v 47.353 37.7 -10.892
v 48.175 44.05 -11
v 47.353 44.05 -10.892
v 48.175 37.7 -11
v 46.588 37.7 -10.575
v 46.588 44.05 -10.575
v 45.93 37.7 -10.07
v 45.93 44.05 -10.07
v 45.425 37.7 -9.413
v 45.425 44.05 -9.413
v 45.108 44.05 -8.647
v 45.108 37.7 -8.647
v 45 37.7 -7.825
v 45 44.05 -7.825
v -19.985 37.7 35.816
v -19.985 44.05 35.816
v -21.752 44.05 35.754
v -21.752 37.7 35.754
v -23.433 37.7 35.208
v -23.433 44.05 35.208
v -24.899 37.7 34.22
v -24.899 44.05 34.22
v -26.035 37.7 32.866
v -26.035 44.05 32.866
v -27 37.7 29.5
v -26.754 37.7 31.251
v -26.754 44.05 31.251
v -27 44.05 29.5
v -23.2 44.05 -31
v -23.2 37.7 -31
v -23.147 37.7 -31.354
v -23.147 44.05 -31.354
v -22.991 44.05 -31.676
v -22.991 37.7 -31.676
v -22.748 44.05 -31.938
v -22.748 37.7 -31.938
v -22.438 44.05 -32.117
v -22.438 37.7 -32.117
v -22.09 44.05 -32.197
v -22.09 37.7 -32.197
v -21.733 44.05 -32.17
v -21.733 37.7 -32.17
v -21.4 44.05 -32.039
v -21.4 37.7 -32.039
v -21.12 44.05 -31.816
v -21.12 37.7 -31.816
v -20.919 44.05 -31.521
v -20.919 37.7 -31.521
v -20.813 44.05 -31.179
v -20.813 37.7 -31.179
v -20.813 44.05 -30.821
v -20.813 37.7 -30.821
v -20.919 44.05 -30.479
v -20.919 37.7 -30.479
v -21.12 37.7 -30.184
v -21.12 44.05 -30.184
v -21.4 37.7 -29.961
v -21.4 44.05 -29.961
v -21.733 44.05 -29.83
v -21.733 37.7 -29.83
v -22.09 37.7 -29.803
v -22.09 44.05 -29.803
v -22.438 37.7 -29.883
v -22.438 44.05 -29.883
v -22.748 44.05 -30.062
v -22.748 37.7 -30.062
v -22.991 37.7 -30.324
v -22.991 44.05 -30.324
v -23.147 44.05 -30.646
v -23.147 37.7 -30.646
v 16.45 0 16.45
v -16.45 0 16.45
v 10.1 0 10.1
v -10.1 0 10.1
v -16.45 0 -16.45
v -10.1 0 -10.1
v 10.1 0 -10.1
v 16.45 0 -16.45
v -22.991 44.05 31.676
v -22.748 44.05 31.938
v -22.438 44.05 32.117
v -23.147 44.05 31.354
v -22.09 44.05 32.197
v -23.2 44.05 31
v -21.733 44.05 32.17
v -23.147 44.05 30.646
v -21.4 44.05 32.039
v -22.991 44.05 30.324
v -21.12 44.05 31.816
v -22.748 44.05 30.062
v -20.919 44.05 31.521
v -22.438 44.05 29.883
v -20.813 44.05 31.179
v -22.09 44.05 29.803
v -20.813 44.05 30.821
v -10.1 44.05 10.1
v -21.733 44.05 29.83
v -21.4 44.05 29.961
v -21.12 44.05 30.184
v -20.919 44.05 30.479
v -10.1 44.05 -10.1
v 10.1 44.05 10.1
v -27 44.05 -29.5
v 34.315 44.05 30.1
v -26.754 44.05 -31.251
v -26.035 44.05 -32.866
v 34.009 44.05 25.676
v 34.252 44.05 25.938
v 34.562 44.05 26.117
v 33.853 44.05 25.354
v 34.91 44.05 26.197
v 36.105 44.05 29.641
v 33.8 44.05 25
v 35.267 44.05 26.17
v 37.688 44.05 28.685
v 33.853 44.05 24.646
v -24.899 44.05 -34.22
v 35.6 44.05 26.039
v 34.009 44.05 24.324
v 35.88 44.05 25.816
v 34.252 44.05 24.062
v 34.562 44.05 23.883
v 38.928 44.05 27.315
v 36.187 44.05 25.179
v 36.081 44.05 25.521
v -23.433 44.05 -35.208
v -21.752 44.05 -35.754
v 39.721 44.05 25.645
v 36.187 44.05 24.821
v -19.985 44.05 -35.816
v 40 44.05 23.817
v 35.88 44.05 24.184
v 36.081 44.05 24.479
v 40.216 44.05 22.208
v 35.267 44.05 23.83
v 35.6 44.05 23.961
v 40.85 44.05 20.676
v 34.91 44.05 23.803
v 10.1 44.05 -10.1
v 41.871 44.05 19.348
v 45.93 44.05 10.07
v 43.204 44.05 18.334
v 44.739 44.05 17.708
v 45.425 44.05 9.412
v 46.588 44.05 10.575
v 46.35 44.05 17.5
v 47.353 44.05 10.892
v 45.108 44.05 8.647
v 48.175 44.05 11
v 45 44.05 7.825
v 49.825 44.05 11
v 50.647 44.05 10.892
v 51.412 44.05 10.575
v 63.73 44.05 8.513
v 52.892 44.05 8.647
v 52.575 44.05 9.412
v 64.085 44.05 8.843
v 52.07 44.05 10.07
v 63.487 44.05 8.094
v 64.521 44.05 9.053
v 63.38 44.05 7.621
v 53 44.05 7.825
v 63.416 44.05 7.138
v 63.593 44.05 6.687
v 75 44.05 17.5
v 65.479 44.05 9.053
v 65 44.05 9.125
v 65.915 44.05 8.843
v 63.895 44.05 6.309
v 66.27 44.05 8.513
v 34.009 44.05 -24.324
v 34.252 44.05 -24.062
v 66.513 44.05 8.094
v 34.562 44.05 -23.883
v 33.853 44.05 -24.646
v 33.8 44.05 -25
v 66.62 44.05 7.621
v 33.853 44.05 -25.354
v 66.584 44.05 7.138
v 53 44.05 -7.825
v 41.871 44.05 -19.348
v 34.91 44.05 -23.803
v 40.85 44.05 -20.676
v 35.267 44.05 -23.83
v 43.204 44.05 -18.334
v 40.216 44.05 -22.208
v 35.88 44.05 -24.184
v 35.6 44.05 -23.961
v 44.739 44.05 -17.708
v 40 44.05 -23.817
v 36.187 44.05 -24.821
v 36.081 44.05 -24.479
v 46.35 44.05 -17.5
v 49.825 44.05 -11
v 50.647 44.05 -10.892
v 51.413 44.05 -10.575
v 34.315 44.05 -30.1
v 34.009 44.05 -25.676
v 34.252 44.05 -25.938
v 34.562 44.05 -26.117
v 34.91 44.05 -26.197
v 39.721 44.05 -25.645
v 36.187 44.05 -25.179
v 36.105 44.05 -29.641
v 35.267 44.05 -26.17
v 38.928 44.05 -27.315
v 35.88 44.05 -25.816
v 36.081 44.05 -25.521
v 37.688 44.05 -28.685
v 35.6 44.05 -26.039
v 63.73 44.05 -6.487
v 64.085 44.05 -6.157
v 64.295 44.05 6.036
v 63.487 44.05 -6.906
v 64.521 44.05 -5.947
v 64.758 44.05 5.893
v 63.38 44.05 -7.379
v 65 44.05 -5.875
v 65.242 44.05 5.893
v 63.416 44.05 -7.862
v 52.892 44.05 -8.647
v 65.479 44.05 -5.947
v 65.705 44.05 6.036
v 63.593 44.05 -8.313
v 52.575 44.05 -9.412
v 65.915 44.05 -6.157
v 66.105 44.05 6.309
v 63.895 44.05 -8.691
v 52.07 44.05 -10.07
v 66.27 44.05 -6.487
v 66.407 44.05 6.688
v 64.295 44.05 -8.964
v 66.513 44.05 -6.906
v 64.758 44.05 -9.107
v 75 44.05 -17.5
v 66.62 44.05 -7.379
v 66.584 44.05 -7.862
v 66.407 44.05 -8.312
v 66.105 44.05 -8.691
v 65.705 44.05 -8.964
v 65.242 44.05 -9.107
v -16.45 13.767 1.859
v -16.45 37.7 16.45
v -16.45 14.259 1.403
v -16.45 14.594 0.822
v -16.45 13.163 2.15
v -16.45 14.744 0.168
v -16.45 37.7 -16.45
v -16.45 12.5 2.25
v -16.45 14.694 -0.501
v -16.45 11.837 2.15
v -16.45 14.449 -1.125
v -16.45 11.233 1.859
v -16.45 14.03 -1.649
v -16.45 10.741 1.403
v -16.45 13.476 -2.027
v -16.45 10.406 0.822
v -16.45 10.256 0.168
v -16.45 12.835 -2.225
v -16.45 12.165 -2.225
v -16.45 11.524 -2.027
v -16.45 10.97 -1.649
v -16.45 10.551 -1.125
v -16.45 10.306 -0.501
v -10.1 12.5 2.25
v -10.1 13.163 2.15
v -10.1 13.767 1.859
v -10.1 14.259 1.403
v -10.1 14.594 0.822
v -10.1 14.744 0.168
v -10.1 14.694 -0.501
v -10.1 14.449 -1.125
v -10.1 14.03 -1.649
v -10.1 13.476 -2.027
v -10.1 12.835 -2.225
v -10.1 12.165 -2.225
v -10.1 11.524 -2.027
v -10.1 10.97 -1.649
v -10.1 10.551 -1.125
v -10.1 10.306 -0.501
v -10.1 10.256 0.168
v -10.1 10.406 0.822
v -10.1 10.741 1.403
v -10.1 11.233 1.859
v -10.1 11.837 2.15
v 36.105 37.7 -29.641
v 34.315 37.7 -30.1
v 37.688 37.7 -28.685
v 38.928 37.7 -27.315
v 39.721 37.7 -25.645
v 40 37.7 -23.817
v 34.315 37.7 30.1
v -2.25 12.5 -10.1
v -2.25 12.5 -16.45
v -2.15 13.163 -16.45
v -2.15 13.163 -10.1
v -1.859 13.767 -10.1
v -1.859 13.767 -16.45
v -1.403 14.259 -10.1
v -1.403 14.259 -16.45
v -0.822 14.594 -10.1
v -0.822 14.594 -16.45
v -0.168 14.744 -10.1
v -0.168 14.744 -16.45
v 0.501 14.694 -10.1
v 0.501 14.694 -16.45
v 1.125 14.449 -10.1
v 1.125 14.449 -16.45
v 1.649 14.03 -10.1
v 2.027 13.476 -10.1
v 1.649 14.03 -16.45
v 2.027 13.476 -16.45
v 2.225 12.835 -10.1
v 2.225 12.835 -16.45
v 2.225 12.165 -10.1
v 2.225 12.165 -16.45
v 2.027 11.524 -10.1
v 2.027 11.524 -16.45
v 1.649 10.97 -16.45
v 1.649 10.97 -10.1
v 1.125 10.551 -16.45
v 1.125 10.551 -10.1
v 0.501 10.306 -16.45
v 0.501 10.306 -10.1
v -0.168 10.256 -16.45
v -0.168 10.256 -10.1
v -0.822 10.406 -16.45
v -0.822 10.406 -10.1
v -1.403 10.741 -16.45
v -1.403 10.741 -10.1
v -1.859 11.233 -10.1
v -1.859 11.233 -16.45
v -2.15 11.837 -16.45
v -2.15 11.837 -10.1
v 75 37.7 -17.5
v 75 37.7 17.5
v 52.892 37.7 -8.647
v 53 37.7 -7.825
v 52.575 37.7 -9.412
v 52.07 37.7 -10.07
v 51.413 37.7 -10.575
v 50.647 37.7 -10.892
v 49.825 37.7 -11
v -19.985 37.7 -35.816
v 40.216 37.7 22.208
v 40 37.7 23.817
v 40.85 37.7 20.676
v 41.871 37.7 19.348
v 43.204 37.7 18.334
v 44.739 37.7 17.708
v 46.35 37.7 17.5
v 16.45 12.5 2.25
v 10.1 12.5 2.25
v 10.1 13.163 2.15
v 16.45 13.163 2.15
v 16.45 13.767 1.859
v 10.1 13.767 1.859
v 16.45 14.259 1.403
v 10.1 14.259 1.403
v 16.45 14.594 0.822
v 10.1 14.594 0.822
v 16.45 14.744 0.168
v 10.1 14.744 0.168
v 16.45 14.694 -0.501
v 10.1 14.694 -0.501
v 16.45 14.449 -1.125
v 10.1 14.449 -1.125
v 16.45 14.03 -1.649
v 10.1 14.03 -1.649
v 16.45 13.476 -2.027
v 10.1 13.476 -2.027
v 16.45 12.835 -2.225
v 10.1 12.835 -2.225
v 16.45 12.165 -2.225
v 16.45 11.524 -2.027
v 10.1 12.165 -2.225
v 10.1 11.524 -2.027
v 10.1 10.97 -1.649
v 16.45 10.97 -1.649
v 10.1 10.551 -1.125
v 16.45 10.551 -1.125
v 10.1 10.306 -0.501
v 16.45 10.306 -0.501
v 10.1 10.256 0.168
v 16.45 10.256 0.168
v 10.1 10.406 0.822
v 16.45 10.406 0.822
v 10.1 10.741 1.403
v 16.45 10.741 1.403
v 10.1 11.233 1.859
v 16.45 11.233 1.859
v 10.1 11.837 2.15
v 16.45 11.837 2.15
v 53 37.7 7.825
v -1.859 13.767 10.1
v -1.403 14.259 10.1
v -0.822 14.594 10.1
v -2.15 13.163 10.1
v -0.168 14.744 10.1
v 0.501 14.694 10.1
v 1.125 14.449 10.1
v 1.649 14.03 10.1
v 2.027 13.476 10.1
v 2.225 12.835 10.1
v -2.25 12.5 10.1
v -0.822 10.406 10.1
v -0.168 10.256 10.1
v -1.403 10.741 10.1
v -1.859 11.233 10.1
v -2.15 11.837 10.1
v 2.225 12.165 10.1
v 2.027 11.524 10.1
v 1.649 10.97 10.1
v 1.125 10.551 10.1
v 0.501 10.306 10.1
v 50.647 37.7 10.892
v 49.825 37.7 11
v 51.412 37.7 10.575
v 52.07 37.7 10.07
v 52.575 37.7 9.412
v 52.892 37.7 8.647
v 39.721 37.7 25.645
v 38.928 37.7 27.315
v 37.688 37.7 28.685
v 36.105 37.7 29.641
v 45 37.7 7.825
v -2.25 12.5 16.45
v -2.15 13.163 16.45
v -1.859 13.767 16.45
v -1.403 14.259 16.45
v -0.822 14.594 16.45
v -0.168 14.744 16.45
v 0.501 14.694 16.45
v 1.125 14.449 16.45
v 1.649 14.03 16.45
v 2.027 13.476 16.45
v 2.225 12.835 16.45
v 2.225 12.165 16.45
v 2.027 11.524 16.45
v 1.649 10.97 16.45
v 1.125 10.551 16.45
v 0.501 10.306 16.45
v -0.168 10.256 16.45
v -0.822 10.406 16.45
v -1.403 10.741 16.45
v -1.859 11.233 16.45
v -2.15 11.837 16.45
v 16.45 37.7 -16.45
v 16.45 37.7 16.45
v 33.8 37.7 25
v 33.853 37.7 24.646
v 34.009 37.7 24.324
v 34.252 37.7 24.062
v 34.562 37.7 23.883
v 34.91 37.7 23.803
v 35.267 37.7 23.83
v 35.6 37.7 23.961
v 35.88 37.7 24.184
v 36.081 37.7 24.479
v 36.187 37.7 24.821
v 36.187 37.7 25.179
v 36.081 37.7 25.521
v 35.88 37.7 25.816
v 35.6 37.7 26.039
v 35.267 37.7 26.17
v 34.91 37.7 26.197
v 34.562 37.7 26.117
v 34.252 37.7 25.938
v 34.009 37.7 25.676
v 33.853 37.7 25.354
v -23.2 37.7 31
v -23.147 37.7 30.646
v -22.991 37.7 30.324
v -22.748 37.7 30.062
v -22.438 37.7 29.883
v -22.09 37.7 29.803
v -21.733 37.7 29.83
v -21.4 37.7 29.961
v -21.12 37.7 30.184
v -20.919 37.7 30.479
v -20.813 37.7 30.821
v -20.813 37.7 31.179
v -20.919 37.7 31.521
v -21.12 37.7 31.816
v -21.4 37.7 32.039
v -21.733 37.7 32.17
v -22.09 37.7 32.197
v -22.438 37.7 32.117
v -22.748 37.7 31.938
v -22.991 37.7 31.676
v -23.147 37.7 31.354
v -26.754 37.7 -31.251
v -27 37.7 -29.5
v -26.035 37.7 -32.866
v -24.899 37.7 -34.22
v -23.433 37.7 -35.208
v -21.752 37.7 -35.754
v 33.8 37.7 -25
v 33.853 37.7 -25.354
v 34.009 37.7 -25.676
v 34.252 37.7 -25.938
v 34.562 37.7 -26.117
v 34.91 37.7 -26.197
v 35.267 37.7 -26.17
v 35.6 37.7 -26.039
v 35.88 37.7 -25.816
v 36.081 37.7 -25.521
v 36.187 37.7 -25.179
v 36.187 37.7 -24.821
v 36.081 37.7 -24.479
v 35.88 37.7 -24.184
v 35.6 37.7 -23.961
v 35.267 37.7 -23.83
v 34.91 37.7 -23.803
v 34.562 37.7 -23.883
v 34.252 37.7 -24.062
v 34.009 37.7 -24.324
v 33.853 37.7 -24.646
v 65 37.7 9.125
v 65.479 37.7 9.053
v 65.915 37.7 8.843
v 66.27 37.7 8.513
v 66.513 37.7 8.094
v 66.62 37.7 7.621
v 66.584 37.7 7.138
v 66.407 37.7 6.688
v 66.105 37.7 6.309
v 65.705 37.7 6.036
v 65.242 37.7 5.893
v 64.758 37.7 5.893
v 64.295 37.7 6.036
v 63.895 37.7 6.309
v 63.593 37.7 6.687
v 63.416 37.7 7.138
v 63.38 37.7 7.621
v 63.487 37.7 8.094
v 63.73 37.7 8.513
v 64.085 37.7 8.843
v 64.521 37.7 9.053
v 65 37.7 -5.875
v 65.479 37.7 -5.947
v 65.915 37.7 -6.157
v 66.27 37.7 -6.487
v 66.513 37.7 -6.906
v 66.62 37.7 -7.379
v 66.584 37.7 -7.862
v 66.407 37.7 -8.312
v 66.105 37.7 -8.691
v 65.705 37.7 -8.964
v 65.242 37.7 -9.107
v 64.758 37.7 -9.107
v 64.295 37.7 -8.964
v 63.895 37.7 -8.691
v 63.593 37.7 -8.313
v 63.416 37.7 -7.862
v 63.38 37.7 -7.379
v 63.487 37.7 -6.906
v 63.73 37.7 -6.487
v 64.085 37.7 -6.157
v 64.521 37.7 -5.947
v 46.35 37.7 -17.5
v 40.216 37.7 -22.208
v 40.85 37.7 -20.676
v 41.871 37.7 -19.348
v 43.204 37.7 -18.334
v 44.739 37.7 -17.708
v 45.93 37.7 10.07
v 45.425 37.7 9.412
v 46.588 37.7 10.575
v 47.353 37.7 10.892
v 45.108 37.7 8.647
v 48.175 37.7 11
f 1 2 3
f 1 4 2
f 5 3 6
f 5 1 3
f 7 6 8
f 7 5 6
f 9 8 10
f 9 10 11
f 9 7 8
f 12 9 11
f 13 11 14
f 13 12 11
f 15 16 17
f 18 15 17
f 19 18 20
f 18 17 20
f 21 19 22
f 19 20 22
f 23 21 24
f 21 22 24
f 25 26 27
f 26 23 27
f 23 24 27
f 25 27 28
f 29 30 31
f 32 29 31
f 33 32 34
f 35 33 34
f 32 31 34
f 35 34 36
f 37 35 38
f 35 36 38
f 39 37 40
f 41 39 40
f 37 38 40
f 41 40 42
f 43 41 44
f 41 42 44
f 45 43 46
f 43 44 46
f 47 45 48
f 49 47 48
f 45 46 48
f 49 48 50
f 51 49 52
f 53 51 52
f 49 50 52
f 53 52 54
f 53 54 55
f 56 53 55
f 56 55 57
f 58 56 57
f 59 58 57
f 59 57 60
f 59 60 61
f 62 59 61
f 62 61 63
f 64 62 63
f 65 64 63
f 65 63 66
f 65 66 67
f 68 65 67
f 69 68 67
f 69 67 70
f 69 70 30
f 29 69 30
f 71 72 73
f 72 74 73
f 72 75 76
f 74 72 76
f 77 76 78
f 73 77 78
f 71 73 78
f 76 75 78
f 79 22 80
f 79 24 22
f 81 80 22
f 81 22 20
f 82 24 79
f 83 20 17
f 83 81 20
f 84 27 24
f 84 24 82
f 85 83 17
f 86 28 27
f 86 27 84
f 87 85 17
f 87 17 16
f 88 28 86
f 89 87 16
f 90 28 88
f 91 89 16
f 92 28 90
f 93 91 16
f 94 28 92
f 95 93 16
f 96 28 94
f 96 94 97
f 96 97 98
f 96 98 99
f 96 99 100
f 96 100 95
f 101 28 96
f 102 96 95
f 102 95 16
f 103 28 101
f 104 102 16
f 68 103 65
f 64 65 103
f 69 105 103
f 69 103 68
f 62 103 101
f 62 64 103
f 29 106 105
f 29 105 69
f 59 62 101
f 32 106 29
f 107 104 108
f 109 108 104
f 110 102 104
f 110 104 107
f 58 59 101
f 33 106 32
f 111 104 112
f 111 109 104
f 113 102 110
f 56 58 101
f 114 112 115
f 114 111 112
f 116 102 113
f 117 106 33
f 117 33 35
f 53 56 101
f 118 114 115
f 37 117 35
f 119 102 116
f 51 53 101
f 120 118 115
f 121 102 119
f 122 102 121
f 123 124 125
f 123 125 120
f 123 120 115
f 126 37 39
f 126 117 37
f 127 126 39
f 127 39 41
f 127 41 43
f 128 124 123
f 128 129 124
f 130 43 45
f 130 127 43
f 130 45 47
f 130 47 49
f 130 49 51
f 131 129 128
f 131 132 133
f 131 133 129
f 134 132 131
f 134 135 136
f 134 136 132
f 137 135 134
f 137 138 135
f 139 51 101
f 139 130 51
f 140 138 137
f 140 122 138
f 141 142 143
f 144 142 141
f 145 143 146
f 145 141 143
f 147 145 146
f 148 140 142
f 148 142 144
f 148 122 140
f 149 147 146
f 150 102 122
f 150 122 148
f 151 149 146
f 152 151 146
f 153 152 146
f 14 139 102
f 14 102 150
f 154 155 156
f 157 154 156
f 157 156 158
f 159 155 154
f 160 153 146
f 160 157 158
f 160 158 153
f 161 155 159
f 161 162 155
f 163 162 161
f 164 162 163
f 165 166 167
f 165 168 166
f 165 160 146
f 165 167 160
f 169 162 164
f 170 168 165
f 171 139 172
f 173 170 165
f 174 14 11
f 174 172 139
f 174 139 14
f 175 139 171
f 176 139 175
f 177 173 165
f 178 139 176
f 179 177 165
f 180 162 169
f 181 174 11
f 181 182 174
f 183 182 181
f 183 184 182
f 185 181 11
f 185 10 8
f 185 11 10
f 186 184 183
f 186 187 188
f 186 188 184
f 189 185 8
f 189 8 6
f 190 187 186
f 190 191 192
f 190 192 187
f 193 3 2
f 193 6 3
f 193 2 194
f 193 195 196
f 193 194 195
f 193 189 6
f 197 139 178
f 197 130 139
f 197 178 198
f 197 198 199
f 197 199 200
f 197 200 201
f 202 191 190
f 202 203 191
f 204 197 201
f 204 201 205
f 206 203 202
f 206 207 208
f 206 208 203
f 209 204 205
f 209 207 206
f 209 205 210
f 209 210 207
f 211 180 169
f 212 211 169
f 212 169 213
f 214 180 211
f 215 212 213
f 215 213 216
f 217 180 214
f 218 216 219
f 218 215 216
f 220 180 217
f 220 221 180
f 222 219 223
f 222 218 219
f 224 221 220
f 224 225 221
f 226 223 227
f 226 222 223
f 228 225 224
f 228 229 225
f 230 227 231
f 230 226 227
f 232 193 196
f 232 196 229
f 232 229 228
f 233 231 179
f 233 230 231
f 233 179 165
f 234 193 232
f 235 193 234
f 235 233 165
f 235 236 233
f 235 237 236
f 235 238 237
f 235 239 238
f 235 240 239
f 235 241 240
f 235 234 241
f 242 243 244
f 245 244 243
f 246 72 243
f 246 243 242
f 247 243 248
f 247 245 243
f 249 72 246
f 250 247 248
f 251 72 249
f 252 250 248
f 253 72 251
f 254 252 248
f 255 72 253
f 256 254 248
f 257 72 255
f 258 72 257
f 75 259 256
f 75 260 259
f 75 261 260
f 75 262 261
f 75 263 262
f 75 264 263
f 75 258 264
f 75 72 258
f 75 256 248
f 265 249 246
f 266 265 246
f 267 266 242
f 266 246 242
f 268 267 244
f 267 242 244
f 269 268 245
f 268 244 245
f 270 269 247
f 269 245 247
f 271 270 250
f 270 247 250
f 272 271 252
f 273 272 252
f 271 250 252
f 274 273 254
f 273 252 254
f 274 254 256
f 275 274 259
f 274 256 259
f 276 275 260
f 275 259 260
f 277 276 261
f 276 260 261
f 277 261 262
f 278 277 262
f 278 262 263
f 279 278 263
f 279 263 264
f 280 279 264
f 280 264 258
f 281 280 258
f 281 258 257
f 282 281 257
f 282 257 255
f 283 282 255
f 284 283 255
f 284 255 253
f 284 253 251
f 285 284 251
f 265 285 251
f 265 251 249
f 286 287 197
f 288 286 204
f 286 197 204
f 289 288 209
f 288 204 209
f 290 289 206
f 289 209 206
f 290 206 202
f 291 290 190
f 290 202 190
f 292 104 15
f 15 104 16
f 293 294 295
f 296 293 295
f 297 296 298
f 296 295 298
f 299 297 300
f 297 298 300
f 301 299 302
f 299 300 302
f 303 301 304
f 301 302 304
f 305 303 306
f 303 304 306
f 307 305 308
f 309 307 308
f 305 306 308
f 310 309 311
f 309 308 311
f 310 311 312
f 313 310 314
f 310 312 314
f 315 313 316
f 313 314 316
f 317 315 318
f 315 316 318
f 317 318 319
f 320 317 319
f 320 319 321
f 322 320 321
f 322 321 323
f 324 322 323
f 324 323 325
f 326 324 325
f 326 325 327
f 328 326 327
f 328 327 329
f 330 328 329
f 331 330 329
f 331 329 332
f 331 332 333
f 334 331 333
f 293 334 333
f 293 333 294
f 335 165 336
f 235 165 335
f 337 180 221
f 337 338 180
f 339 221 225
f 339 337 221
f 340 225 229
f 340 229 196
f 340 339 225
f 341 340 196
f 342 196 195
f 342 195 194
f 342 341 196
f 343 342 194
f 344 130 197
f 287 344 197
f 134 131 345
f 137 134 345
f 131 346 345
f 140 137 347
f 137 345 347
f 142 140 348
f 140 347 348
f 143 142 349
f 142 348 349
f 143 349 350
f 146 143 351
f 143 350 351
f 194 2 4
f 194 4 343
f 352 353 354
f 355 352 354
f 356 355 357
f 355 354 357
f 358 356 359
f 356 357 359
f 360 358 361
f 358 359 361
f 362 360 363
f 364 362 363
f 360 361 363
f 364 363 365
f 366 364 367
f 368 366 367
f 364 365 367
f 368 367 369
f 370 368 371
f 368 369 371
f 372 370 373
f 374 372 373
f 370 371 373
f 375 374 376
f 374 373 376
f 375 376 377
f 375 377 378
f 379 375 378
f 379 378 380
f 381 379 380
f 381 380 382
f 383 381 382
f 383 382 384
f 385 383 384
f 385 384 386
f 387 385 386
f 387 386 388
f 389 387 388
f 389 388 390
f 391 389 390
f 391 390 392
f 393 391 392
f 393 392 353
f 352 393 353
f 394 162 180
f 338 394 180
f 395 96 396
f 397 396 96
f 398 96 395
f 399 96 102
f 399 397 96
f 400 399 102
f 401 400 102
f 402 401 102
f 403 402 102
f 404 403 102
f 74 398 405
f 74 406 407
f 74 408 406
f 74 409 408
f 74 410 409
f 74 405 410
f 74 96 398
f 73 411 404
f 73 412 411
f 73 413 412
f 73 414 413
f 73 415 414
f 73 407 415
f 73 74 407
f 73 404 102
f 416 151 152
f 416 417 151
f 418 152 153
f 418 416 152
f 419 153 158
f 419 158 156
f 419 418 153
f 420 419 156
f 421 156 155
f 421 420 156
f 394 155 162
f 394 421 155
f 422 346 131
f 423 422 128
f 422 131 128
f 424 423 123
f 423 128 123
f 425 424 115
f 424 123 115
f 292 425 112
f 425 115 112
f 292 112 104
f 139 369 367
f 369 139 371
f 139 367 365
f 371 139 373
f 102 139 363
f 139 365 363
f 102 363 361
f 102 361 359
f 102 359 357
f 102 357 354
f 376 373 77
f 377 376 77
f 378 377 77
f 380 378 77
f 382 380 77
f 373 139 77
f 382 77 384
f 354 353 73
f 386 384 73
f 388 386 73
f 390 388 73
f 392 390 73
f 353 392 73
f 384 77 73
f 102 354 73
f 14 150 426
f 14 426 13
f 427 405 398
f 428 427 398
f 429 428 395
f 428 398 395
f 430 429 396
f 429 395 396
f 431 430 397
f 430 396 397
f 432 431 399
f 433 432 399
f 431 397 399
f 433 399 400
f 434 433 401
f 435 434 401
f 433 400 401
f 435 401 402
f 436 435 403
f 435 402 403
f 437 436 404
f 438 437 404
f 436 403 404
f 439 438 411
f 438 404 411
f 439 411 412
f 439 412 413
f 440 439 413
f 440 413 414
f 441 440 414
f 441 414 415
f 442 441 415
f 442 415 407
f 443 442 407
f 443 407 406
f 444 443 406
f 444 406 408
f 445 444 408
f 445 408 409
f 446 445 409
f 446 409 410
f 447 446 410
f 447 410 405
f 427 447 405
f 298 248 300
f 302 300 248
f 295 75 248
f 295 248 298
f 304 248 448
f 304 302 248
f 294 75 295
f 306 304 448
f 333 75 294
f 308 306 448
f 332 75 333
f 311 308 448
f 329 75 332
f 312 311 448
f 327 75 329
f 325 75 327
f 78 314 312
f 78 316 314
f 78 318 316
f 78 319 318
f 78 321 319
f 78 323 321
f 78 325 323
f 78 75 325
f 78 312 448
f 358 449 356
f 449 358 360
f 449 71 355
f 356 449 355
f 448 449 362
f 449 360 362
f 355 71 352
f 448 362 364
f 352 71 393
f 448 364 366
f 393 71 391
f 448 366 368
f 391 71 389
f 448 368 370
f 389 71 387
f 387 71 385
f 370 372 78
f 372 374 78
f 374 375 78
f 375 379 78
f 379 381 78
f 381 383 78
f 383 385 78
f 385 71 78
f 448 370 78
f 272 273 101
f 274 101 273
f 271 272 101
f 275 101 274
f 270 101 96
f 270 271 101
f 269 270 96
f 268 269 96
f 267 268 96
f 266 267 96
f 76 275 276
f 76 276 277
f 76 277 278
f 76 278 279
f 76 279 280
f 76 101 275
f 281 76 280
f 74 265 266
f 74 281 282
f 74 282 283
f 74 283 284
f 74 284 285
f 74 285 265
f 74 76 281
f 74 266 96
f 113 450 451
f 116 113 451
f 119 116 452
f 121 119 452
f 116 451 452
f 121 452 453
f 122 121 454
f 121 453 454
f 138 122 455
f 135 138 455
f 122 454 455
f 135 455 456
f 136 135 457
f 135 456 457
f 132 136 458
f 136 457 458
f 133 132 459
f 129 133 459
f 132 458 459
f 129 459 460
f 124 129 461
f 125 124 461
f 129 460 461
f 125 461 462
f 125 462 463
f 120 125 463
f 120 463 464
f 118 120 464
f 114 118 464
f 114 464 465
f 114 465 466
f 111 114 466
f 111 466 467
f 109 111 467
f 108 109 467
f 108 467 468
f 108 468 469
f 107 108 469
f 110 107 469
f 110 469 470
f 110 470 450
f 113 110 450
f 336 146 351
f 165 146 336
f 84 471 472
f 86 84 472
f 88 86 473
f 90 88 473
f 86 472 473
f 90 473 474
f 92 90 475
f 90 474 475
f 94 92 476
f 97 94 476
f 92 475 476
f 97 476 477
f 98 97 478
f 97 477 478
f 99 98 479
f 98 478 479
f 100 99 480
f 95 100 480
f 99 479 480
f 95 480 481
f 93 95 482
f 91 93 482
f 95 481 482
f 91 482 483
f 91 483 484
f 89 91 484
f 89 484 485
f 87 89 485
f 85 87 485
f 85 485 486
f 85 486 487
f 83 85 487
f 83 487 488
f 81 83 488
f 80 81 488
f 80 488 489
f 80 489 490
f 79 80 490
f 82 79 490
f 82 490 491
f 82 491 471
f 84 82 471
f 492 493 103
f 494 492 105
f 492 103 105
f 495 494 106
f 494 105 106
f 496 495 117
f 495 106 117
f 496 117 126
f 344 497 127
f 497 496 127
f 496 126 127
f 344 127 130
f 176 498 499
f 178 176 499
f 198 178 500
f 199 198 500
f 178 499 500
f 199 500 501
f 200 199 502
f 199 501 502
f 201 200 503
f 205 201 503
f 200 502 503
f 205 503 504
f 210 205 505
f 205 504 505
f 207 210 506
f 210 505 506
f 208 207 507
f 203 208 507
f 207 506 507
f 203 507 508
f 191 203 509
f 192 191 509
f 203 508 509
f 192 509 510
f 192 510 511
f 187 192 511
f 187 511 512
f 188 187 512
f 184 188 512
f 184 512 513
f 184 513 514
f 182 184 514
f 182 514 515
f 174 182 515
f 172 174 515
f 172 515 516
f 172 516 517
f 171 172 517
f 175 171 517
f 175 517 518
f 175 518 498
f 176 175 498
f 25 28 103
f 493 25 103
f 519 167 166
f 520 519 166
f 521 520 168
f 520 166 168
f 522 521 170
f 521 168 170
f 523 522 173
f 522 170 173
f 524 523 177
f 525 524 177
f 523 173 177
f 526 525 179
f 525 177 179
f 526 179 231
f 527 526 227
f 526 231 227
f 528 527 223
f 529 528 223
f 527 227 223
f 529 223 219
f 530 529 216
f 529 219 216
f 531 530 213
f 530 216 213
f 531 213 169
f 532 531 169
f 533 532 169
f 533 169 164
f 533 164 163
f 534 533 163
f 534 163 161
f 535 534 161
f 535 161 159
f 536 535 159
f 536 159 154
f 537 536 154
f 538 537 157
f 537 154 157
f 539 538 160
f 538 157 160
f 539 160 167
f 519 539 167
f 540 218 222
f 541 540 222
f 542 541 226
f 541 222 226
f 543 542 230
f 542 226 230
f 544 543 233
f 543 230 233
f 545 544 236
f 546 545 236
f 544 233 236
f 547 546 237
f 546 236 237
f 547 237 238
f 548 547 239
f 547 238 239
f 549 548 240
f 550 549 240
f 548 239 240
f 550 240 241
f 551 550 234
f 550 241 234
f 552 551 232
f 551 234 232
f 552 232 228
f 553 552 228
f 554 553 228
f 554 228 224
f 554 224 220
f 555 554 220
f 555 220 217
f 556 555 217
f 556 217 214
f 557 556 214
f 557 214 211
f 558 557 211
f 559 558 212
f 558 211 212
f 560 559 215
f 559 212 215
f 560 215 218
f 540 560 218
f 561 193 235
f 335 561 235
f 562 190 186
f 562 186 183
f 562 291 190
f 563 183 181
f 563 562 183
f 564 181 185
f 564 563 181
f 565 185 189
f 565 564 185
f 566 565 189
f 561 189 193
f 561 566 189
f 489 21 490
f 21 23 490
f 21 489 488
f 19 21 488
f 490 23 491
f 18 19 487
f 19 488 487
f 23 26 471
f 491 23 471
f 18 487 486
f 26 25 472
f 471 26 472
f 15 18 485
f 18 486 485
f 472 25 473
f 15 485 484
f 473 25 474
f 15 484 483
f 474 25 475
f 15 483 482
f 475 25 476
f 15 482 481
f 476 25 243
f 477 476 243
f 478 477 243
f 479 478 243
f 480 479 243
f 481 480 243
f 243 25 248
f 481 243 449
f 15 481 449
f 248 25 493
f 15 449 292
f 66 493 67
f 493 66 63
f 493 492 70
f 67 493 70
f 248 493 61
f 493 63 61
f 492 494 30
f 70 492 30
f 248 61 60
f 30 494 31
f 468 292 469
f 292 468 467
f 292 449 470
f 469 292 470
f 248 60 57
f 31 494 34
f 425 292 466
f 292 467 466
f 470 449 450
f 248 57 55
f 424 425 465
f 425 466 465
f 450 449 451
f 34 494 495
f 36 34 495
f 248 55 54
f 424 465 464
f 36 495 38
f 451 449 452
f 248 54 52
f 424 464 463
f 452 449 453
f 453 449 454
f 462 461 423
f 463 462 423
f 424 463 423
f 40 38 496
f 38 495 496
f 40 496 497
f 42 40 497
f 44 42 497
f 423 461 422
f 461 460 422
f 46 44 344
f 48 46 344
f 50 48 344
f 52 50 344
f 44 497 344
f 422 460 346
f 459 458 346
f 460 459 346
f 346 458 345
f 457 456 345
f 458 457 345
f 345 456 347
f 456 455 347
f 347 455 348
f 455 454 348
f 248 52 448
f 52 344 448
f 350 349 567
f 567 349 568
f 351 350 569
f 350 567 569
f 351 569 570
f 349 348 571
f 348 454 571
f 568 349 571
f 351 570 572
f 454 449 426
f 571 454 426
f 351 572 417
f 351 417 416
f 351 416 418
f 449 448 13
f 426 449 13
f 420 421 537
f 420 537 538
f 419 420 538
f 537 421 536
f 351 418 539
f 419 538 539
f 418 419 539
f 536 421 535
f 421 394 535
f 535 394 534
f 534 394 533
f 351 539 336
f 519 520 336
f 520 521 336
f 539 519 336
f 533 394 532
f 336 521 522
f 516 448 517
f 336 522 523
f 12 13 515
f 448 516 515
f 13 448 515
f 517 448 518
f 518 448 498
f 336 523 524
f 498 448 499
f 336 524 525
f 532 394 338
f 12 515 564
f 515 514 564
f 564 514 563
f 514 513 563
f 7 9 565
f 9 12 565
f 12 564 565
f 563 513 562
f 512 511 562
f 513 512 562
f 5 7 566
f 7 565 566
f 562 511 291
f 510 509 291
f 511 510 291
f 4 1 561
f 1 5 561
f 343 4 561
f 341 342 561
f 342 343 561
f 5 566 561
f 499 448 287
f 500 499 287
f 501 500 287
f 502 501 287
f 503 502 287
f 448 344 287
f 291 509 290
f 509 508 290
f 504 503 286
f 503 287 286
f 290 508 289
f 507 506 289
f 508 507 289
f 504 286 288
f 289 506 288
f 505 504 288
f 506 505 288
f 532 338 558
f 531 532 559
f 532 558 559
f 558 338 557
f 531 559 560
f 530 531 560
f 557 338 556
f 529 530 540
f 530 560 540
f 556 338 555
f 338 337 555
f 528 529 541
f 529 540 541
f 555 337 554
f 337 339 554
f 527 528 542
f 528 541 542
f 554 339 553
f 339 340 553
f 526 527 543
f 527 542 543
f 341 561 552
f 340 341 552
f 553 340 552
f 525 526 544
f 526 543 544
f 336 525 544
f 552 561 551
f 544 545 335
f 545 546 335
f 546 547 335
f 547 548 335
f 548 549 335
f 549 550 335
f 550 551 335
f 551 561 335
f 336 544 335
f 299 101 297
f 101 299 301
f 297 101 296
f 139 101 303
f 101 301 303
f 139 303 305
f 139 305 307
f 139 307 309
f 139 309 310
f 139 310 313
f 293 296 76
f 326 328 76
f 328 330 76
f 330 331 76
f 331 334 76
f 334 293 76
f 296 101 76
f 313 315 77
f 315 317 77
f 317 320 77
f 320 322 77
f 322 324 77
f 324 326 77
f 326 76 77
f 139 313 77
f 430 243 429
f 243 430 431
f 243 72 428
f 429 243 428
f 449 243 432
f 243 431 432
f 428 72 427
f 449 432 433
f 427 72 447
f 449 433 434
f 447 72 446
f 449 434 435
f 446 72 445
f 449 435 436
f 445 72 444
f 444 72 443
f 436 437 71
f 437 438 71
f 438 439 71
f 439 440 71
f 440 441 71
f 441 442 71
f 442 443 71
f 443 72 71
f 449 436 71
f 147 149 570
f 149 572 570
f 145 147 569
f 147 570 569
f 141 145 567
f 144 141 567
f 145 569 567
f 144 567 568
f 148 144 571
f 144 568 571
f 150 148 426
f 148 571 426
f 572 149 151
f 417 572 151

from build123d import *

# Parameters (mm, degrees)
SKETCH1_W            = 32.9
SKETCH1_H            = 32.9
SKETCH1_W_2          = 20.2
SKETCH1_H_2          = 20.2
BOSS_EXTRUDE1_DEPTH  = 25
M4_CLEARANCE_HOLE1_D = 4.5
M4_CLEARANCE_HOLE2_D = 4.5
SKETCH8_W            = 32.9
SKETCH8_H            = 32.9
SKETCH8_W_2          = 20.2
SKETCH8_H_2          = 20.2
BOSS_EXTRUDE2_DEPTH  = 12.7
SKETCH9_W            = 87.4
SKETCH9_H            = 82.4
BOSS_EXTRUDE3_DEPTH  = 6.35
M2_CLEARANCE_HOLE1_D = 2.4
SKETCH13_W           = 20.2
SKETCH13_H           = 20.2
CUT_EXTRUDE1_DEPTH   = 71.911353111
SKETCH14_W           = 87.4
SKETCH14_H           = 82.4
CUT_EXTRUDE2_DEPTH   = 75.481759512
SKETCH15_W           = 35
SKETCH15_H           = 35
SKETCH15_R           = 1.625
BOSS_EXTRUDE4_DEPTH  = 6.35
FILLET1_R            = 6.35
SKETCH16_W           = 8
SKETCH16_H           = 22
CUT_EXTRUDE3_DEPTH   = 95.077926699
FILLET2_R            = 3.175


with BuildPart() as part:
    # Sketch1 → Boss-Extrude1 (new body)
    with BuildSketch(Plane(origin=(0, 0, 0), x_dir=(1, 0, 0), z_dir=(0, 1, 0))):
        Rectangle(SKETCH1_W, SKETCH1_H)
        Rectangle(SKETCH1_W_2, SKETCH1_H_2, mode=Mode.SUBTRACT)
    extrude(amount=BOSS_EXTRUDE1_DEPTH)

    # M4 Clearance Hole1 (through all)
    with Locations(Plane.XY.offset(16.45)):
        with Locations((0, 12.5)):
            Hole(M4_CLEARANCE_HOLE1_D / 2)

    # M4 Clearance Hole2 (through all)
    with Locations(Plane(origin=(16.45, 0, 0), x_dir=(0, 0, -1), z_dir=(1, 0, 0))):
        with Locations((0, 12.5)):
            Hole(M4_CLEARANCE_HOLE2_D / 2)

    # Sketch8 → Boss-Extrude2 (add)
    with BuildSketch(Plane(origin=(0, 25, 0), x_dir=(1, 0, 0), z_dir=(0, 1, 0))):
        Rectangle(SKETCH8_W, SKETCH8_H)
        Rectangle(SKETCH8_W_2, SKETCH8_H_2, mode=Mode.SUBTRACT)
    extrude(amount=BOSS_EXTRUDE2_DEPTH)

    # Sketch9 → Boss-Extrude3 (add)
    with BuildSketch(Plane(origin=(0, 37.7, 0), x_dir=(1, 0, 0), z_dir=(0, 1, 0))):
        Rectangle(SKETCH9_W, SKETCH9_H)
    extrude(amount=BOSS_EXTRUDE3_DEPTH)

    # M2 Clearance Hole1 (through all)
    with Locations(Plane(origin=(0, 44.05, 0), x_dir=(1, 0, 0), z_dir=(0, 1, 0))):
        with Locations((35, -25), (-22, -31), (-22, 31), (35, 25)):
            Hole(M2_CLEARANCE_HOLE1_D / 2)

    # Sketch13 → Cut-Extrude1 (cut, through all)
    with BuildSketch(Plane.XZ.offset(-37.7)):
        Rectangle(SKETCH13_W, SKETCH13_H)
    extrude(amount=-CUT_EXTRUDE1_DEPTH, mode=Mode.SUBTRACT)

    # Sketch14 → Cut-Extrude2 (cut, through all)
    with BuildSketch(Plane(origin=(0, 44.05, 0), x_dir=(1, 0, 0), z_dir=(0, 1, 0))):
        Rectangle(SKETCH14_W, SKETCH14_H)
        with BuildLine():
            Line((40, 23.784646643), (40, -23.784646643))
            ThreePointArc((40, -23.784646643), (38.369303562, -28.033255108), (34.314748382, -30.099756269))
            Line((34.314748382, -30.099756269), (-19.985251618, -35.815545743))
            ThreePointArc((-19.985251618, -35.815545743), (-24.898608465, -34.219739679), (-27, -29.500436117))
            Line((-27, -29.500436117), (-27, 29.500436117))
            ThreePointArc((-27, 29.500436117), (-24.898608465, 34.219739679), (-19.985251618, 35.815545743))
            Line((-19.985251618, 35.815545743), (34.314748382, 30.099756269))
            ThreePointArc((34.314748382, 30.099756269), (38.369303562, 28.033255108), (40, 23.784646643))
        make_face(mode=Mode.SUBTRACT)
    extrude(amount=-CUT_EXTRUDE2_DEPTH, mode=Mode.SUBTRACT)

    # Sketch15 → Boss-Extrude4 (add)
    with BuildSketch(Plane(origin=(0, 44.05, 0), x_dir=(1, 0, 0), z_dir=(0, 1, 0))):
        with Locations((57.5, 0)):
            Rectangle(SKETCH15_W, SKETCH15_H)
        with Locations(Location((65, 7.5, 0), (0, 0, 270))):
            Circle(SKETCH15_R, mode=Mode.SUBTRACT)
        with Locations(Location((65, -7.5, 0), (0, 0, 270))):
            Circle(SKETCH15_R, mode=Mode.SUBTRACT)
    extrude(amount=-BOSS_EXTRUDE4_DEPTH)

    # Fillet1
    fillet1_edges = [part.edges().sort_by_distance(p)[0] for p in [
        (40, 40.875, 17.5),
        (40, 40.875, -17.5),
    ]]
    fillet(fillet1_edges, radius=FILLET1_R)

    # Sketch16 → Cut-Extrude3 (cut, through all)
    with BuildSketch(Plane(origin=(0, 44.05, 0), x_dir=(1, 0, 0), z_dir=(0, 1, 0))):
        with Locations((49, 0)):
            Rectangle(SKETCH16_W, SKETCH16_H)
    extrude(amount=-CUT_EXTRUDE3_DEPTH, mode=Mode.SUBTRACT)

    # Fillet2
    fillet2_edges = [part.edges().sort_by_distance(p)[0] for p in [
        (45, 40.875, 11),
        (45, 40.875, -11),
        (53, 40.875, -11),
        (53, 40.875, 11),
    ]]
    fillet(fillet2_edges, radius=FILLET2_R)


solid = part.part
